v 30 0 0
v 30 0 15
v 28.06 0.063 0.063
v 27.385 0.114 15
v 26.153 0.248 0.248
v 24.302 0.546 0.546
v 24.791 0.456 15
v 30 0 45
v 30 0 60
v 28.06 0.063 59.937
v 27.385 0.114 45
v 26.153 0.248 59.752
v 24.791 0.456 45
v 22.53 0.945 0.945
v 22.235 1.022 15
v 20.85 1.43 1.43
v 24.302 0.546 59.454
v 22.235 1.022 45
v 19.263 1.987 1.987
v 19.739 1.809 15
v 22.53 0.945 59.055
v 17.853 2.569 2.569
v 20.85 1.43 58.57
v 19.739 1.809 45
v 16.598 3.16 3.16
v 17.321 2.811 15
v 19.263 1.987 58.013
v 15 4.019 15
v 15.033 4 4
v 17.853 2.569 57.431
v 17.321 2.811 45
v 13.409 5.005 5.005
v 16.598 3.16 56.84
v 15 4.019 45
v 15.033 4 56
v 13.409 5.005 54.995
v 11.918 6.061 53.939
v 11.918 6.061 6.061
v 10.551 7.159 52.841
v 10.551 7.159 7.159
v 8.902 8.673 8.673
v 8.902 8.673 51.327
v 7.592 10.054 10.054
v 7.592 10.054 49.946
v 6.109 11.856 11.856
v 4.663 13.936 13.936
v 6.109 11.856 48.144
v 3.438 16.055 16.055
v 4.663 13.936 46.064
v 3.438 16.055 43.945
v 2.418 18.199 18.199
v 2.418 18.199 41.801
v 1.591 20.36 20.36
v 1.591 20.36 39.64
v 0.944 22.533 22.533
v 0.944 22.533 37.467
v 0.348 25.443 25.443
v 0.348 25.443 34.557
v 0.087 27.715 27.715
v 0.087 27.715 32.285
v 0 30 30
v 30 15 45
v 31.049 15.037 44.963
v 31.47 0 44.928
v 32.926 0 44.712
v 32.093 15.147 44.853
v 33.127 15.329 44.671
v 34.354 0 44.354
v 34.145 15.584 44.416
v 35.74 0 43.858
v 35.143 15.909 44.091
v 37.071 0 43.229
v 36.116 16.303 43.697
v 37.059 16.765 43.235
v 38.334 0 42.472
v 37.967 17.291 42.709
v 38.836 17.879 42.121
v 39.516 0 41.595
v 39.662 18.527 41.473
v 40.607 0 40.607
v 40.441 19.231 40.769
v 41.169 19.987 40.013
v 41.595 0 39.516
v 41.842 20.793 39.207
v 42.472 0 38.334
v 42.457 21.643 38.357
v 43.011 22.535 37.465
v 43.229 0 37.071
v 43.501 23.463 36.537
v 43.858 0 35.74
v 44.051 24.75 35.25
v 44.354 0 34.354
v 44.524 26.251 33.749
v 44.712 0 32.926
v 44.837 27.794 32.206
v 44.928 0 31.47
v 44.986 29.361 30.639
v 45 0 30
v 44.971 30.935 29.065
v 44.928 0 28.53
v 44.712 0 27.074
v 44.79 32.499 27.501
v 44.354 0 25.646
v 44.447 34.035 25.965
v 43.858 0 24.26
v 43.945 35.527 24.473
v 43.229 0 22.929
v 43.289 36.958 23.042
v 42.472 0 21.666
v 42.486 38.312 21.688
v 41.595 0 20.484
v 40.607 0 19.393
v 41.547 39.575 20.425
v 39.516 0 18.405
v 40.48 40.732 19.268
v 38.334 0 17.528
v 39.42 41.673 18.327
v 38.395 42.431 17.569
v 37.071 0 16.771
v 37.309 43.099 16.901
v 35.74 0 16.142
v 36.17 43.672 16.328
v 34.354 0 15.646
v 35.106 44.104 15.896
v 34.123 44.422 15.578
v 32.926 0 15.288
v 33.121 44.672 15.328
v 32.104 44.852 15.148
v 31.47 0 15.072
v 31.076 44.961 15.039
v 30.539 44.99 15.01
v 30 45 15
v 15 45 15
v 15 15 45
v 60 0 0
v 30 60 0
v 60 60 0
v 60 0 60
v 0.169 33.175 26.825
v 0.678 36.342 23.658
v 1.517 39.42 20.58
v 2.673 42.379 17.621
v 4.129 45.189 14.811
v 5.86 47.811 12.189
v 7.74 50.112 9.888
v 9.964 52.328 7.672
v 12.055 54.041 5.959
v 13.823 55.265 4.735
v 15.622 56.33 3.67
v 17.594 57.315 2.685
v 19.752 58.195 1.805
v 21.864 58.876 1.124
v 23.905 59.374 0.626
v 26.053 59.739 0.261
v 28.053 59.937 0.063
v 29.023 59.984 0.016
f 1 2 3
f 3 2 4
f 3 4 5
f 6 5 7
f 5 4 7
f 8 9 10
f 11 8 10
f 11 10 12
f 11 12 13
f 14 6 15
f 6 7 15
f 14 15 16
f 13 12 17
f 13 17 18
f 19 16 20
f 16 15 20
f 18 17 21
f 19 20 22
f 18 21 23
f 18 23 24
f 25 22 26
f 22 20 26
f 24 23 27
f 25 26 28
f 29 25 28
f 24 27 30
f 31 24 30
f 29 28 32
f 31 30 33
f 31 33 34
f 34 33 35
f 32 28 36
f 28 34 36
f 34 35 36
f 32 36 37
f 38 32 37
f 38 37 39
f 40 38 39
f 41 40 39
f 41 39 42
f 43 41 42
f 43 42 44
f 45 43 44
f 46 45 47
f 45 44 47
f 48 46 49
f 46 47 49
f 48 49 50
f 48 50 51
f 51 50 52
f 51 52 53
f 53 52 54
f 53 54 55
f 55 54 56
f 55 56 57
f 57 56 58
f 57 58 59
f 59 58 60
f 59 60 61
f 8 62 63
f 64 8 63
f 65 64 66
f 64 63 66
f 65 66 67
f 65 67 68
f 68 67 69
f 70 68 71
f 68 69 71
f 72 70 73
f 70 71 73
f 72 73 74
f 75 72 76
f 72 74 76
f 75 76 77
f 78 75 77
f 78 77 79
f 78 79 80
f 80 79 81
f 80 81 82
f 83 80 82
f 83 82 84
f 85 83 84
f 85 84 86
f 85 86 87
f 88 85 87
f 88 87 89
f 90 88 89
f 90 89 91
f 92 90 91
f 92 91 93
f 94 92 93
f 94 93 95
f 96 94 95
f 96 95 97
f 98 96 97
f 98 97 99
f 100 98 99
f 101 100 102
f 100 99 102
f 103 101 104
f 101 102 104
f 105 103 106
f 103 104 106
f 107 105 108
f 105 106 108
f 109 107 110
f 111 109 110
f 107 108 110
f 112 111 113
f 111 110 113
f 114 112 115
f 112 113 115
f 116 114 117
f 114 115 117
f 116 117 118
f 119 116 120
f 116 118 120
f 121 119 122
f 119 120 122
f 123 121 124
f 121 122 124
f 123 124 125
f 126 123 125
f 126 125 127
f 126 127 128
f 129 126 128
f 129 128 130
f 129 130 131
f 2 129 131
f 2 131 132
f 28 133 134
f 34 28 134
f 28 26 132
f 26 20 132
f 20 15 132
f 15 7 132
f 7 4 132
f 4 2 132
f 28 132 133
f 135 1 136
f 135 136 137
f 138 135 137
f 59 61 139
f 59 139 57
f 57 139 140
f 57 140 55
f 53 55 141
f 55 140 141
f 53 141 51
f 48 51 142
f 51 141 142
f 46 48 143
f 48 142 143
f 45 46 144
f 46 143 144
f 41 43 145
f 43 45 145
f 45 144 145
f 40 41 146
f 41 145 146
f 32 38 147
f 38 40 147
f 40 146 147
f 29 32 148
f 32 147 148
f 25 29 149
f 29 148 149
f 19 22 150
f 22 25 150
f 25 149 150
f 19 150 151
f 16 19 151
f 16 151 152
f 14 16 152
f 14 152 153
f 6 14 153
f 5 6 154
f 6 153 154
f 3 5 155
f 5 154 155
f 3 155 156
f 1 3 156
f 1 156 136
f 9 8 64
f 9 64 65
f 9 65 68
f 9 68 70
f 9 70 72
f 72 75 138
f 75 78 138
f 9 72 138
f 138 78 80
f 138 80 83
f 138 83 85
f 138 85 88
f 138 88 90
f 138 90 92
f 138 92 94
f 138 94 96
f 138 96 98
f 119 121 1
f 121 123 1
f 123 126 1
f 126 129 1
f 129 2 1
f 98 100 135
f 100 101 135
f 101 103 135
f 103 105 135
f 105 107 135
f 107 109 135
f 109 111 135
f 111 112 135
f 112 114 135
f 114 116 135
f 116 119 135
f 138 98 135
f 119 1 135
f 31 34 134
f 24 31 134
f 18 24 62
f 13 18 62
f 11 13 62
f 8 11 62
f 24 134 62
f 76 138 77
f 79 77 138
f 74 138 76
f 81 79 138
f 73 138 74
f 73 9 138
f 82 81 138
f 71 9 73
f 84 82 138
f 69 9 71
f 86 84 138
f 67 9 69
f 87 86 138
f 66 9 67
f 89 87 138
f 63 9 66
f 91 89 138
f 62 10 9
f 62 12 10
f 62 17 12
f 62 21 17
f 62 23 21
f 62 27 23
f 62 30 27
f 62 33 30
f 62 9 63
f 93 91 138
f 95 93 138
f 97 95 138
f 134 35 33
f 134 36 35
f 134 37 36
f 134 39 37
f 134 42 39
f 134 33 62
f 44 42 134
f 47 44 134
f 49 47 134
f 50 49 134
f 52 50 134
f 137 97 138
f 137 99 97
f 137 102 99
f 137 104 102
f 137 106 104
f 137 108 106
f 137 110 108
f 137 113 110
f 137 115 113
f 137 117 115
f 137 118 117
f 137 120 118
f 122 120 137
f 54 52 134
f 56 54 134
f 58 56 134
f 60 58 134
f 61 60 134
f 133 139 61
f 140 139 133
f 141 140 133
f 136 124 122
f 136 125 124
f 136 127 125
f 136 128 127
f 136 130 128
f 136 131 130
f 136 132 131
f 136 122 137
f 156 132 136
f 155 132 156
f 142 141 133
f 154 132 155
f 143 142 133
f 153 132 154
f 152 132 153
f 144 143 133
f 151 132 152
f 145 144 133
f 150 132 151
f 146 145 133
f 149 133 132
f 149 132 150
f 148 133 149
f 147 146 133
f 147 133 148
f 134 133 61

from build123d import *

# Parameters (mm, degrees)
SKETCH1_W           = 60
SKETCH1_H           = 60
BOSS_EXTRUDE1_DEPTH = 60
CUT_EXTRUDE1_DEPTH  = 60
CUT_EXTRUDE2_DEPTH  = 60
CUT_EXTRUDE3_DEPTH  = 60
CUT_EXTRUDE6_DEPTH  = 60


with BuildPart() as part:
    # Sketch1 → Boss-Extrude1 (new body)
    with BuildSketch(Plane.XY):
        with Locations((30, 30)):
            Rectangle(SKETCH1_W, SKETCH1_H)
    extrude(amount=BOSS_EXTRUDE1_DEPTH)

    # Sketch2 → Cut-Extrude1 (cut)
    with BuildSketch(Plane.XY.offset(60)):
        with BuildLine():
            ThreePointArc((0, 30), (8.786796564, 51.213203436), (30, 60))
            Line((30, 60), (0, 60))
            Line((0, 60), (0, 30))
        make_face()
        with BuildLine():
            ThreePointArc((30, 0), (8.786796564, 8.786796564), (0, 30))
            Line((0, 30), (0, 0))
            Line((0, 0), (30, 0))
        make_face()
    extrude(amount=-CUT_EXTRUDE1_DEPTH, mode=Mode.SUBTRACT)

    # Sketch3 → Cut-Extrude2 (cut)
    with BuildSketch(Plane(origin=(0, 60, 0), x_dir=(1, 0, 0), z_dir=(0, 1, 0))):
        with BuildLine():
            ThreePointArc((0, -29.999999939), (8.786796586, -8.786796543), (30, 0))
            Line((30, 0), (0, 0))
            Line((0, 0), (0, -29.999999939))
        make_face()
        with BuildLine():
            Line((0, -60), (30, -60))
            ThreePointArc((30, -60), (8.786796543, -51.213203414), (0, -29.999999939))
            Line((0, -29.999999939), (0, -60))
        make_face()
    extrude(amount=-CUT_EXTRUDE2_DEPTH, mode=Mode.SUBTRACT)

    # Sketch4 → Cut-Extrude3 (cut)
    with BuildSketch(Plane(origin=(0, 0, 0), x_dir=(0, 0, -1), z_dir=(1, 0, 0))):
        Polygon((0, 60), (-60, 60), (-60, 0), align=None)
    extrude(amount=CUT_EXTRUDE3_DEPTH, mode=Mode.SUBTRACT)

    # Sketch6 → Cut-Extrude6 (cut)
    with BuildSketch(Plane(origin=(0, 60, 0), x_dir=(1, 0, 0), z_dir=(0, 1, 0))):
        with BuildLine():
            Line((15, -15), (15, -45))
            Line((15, -45), (30, -45))
            ThreePointArc((30, -45), (45, -30), (30, -15))
            Line((30, -15), (15, -15))
        make_face()
    extrude(amount=-CUT_EXTRUDE6_DEPTH, mode=Mode.SUBTRACT)


solid = part.part
